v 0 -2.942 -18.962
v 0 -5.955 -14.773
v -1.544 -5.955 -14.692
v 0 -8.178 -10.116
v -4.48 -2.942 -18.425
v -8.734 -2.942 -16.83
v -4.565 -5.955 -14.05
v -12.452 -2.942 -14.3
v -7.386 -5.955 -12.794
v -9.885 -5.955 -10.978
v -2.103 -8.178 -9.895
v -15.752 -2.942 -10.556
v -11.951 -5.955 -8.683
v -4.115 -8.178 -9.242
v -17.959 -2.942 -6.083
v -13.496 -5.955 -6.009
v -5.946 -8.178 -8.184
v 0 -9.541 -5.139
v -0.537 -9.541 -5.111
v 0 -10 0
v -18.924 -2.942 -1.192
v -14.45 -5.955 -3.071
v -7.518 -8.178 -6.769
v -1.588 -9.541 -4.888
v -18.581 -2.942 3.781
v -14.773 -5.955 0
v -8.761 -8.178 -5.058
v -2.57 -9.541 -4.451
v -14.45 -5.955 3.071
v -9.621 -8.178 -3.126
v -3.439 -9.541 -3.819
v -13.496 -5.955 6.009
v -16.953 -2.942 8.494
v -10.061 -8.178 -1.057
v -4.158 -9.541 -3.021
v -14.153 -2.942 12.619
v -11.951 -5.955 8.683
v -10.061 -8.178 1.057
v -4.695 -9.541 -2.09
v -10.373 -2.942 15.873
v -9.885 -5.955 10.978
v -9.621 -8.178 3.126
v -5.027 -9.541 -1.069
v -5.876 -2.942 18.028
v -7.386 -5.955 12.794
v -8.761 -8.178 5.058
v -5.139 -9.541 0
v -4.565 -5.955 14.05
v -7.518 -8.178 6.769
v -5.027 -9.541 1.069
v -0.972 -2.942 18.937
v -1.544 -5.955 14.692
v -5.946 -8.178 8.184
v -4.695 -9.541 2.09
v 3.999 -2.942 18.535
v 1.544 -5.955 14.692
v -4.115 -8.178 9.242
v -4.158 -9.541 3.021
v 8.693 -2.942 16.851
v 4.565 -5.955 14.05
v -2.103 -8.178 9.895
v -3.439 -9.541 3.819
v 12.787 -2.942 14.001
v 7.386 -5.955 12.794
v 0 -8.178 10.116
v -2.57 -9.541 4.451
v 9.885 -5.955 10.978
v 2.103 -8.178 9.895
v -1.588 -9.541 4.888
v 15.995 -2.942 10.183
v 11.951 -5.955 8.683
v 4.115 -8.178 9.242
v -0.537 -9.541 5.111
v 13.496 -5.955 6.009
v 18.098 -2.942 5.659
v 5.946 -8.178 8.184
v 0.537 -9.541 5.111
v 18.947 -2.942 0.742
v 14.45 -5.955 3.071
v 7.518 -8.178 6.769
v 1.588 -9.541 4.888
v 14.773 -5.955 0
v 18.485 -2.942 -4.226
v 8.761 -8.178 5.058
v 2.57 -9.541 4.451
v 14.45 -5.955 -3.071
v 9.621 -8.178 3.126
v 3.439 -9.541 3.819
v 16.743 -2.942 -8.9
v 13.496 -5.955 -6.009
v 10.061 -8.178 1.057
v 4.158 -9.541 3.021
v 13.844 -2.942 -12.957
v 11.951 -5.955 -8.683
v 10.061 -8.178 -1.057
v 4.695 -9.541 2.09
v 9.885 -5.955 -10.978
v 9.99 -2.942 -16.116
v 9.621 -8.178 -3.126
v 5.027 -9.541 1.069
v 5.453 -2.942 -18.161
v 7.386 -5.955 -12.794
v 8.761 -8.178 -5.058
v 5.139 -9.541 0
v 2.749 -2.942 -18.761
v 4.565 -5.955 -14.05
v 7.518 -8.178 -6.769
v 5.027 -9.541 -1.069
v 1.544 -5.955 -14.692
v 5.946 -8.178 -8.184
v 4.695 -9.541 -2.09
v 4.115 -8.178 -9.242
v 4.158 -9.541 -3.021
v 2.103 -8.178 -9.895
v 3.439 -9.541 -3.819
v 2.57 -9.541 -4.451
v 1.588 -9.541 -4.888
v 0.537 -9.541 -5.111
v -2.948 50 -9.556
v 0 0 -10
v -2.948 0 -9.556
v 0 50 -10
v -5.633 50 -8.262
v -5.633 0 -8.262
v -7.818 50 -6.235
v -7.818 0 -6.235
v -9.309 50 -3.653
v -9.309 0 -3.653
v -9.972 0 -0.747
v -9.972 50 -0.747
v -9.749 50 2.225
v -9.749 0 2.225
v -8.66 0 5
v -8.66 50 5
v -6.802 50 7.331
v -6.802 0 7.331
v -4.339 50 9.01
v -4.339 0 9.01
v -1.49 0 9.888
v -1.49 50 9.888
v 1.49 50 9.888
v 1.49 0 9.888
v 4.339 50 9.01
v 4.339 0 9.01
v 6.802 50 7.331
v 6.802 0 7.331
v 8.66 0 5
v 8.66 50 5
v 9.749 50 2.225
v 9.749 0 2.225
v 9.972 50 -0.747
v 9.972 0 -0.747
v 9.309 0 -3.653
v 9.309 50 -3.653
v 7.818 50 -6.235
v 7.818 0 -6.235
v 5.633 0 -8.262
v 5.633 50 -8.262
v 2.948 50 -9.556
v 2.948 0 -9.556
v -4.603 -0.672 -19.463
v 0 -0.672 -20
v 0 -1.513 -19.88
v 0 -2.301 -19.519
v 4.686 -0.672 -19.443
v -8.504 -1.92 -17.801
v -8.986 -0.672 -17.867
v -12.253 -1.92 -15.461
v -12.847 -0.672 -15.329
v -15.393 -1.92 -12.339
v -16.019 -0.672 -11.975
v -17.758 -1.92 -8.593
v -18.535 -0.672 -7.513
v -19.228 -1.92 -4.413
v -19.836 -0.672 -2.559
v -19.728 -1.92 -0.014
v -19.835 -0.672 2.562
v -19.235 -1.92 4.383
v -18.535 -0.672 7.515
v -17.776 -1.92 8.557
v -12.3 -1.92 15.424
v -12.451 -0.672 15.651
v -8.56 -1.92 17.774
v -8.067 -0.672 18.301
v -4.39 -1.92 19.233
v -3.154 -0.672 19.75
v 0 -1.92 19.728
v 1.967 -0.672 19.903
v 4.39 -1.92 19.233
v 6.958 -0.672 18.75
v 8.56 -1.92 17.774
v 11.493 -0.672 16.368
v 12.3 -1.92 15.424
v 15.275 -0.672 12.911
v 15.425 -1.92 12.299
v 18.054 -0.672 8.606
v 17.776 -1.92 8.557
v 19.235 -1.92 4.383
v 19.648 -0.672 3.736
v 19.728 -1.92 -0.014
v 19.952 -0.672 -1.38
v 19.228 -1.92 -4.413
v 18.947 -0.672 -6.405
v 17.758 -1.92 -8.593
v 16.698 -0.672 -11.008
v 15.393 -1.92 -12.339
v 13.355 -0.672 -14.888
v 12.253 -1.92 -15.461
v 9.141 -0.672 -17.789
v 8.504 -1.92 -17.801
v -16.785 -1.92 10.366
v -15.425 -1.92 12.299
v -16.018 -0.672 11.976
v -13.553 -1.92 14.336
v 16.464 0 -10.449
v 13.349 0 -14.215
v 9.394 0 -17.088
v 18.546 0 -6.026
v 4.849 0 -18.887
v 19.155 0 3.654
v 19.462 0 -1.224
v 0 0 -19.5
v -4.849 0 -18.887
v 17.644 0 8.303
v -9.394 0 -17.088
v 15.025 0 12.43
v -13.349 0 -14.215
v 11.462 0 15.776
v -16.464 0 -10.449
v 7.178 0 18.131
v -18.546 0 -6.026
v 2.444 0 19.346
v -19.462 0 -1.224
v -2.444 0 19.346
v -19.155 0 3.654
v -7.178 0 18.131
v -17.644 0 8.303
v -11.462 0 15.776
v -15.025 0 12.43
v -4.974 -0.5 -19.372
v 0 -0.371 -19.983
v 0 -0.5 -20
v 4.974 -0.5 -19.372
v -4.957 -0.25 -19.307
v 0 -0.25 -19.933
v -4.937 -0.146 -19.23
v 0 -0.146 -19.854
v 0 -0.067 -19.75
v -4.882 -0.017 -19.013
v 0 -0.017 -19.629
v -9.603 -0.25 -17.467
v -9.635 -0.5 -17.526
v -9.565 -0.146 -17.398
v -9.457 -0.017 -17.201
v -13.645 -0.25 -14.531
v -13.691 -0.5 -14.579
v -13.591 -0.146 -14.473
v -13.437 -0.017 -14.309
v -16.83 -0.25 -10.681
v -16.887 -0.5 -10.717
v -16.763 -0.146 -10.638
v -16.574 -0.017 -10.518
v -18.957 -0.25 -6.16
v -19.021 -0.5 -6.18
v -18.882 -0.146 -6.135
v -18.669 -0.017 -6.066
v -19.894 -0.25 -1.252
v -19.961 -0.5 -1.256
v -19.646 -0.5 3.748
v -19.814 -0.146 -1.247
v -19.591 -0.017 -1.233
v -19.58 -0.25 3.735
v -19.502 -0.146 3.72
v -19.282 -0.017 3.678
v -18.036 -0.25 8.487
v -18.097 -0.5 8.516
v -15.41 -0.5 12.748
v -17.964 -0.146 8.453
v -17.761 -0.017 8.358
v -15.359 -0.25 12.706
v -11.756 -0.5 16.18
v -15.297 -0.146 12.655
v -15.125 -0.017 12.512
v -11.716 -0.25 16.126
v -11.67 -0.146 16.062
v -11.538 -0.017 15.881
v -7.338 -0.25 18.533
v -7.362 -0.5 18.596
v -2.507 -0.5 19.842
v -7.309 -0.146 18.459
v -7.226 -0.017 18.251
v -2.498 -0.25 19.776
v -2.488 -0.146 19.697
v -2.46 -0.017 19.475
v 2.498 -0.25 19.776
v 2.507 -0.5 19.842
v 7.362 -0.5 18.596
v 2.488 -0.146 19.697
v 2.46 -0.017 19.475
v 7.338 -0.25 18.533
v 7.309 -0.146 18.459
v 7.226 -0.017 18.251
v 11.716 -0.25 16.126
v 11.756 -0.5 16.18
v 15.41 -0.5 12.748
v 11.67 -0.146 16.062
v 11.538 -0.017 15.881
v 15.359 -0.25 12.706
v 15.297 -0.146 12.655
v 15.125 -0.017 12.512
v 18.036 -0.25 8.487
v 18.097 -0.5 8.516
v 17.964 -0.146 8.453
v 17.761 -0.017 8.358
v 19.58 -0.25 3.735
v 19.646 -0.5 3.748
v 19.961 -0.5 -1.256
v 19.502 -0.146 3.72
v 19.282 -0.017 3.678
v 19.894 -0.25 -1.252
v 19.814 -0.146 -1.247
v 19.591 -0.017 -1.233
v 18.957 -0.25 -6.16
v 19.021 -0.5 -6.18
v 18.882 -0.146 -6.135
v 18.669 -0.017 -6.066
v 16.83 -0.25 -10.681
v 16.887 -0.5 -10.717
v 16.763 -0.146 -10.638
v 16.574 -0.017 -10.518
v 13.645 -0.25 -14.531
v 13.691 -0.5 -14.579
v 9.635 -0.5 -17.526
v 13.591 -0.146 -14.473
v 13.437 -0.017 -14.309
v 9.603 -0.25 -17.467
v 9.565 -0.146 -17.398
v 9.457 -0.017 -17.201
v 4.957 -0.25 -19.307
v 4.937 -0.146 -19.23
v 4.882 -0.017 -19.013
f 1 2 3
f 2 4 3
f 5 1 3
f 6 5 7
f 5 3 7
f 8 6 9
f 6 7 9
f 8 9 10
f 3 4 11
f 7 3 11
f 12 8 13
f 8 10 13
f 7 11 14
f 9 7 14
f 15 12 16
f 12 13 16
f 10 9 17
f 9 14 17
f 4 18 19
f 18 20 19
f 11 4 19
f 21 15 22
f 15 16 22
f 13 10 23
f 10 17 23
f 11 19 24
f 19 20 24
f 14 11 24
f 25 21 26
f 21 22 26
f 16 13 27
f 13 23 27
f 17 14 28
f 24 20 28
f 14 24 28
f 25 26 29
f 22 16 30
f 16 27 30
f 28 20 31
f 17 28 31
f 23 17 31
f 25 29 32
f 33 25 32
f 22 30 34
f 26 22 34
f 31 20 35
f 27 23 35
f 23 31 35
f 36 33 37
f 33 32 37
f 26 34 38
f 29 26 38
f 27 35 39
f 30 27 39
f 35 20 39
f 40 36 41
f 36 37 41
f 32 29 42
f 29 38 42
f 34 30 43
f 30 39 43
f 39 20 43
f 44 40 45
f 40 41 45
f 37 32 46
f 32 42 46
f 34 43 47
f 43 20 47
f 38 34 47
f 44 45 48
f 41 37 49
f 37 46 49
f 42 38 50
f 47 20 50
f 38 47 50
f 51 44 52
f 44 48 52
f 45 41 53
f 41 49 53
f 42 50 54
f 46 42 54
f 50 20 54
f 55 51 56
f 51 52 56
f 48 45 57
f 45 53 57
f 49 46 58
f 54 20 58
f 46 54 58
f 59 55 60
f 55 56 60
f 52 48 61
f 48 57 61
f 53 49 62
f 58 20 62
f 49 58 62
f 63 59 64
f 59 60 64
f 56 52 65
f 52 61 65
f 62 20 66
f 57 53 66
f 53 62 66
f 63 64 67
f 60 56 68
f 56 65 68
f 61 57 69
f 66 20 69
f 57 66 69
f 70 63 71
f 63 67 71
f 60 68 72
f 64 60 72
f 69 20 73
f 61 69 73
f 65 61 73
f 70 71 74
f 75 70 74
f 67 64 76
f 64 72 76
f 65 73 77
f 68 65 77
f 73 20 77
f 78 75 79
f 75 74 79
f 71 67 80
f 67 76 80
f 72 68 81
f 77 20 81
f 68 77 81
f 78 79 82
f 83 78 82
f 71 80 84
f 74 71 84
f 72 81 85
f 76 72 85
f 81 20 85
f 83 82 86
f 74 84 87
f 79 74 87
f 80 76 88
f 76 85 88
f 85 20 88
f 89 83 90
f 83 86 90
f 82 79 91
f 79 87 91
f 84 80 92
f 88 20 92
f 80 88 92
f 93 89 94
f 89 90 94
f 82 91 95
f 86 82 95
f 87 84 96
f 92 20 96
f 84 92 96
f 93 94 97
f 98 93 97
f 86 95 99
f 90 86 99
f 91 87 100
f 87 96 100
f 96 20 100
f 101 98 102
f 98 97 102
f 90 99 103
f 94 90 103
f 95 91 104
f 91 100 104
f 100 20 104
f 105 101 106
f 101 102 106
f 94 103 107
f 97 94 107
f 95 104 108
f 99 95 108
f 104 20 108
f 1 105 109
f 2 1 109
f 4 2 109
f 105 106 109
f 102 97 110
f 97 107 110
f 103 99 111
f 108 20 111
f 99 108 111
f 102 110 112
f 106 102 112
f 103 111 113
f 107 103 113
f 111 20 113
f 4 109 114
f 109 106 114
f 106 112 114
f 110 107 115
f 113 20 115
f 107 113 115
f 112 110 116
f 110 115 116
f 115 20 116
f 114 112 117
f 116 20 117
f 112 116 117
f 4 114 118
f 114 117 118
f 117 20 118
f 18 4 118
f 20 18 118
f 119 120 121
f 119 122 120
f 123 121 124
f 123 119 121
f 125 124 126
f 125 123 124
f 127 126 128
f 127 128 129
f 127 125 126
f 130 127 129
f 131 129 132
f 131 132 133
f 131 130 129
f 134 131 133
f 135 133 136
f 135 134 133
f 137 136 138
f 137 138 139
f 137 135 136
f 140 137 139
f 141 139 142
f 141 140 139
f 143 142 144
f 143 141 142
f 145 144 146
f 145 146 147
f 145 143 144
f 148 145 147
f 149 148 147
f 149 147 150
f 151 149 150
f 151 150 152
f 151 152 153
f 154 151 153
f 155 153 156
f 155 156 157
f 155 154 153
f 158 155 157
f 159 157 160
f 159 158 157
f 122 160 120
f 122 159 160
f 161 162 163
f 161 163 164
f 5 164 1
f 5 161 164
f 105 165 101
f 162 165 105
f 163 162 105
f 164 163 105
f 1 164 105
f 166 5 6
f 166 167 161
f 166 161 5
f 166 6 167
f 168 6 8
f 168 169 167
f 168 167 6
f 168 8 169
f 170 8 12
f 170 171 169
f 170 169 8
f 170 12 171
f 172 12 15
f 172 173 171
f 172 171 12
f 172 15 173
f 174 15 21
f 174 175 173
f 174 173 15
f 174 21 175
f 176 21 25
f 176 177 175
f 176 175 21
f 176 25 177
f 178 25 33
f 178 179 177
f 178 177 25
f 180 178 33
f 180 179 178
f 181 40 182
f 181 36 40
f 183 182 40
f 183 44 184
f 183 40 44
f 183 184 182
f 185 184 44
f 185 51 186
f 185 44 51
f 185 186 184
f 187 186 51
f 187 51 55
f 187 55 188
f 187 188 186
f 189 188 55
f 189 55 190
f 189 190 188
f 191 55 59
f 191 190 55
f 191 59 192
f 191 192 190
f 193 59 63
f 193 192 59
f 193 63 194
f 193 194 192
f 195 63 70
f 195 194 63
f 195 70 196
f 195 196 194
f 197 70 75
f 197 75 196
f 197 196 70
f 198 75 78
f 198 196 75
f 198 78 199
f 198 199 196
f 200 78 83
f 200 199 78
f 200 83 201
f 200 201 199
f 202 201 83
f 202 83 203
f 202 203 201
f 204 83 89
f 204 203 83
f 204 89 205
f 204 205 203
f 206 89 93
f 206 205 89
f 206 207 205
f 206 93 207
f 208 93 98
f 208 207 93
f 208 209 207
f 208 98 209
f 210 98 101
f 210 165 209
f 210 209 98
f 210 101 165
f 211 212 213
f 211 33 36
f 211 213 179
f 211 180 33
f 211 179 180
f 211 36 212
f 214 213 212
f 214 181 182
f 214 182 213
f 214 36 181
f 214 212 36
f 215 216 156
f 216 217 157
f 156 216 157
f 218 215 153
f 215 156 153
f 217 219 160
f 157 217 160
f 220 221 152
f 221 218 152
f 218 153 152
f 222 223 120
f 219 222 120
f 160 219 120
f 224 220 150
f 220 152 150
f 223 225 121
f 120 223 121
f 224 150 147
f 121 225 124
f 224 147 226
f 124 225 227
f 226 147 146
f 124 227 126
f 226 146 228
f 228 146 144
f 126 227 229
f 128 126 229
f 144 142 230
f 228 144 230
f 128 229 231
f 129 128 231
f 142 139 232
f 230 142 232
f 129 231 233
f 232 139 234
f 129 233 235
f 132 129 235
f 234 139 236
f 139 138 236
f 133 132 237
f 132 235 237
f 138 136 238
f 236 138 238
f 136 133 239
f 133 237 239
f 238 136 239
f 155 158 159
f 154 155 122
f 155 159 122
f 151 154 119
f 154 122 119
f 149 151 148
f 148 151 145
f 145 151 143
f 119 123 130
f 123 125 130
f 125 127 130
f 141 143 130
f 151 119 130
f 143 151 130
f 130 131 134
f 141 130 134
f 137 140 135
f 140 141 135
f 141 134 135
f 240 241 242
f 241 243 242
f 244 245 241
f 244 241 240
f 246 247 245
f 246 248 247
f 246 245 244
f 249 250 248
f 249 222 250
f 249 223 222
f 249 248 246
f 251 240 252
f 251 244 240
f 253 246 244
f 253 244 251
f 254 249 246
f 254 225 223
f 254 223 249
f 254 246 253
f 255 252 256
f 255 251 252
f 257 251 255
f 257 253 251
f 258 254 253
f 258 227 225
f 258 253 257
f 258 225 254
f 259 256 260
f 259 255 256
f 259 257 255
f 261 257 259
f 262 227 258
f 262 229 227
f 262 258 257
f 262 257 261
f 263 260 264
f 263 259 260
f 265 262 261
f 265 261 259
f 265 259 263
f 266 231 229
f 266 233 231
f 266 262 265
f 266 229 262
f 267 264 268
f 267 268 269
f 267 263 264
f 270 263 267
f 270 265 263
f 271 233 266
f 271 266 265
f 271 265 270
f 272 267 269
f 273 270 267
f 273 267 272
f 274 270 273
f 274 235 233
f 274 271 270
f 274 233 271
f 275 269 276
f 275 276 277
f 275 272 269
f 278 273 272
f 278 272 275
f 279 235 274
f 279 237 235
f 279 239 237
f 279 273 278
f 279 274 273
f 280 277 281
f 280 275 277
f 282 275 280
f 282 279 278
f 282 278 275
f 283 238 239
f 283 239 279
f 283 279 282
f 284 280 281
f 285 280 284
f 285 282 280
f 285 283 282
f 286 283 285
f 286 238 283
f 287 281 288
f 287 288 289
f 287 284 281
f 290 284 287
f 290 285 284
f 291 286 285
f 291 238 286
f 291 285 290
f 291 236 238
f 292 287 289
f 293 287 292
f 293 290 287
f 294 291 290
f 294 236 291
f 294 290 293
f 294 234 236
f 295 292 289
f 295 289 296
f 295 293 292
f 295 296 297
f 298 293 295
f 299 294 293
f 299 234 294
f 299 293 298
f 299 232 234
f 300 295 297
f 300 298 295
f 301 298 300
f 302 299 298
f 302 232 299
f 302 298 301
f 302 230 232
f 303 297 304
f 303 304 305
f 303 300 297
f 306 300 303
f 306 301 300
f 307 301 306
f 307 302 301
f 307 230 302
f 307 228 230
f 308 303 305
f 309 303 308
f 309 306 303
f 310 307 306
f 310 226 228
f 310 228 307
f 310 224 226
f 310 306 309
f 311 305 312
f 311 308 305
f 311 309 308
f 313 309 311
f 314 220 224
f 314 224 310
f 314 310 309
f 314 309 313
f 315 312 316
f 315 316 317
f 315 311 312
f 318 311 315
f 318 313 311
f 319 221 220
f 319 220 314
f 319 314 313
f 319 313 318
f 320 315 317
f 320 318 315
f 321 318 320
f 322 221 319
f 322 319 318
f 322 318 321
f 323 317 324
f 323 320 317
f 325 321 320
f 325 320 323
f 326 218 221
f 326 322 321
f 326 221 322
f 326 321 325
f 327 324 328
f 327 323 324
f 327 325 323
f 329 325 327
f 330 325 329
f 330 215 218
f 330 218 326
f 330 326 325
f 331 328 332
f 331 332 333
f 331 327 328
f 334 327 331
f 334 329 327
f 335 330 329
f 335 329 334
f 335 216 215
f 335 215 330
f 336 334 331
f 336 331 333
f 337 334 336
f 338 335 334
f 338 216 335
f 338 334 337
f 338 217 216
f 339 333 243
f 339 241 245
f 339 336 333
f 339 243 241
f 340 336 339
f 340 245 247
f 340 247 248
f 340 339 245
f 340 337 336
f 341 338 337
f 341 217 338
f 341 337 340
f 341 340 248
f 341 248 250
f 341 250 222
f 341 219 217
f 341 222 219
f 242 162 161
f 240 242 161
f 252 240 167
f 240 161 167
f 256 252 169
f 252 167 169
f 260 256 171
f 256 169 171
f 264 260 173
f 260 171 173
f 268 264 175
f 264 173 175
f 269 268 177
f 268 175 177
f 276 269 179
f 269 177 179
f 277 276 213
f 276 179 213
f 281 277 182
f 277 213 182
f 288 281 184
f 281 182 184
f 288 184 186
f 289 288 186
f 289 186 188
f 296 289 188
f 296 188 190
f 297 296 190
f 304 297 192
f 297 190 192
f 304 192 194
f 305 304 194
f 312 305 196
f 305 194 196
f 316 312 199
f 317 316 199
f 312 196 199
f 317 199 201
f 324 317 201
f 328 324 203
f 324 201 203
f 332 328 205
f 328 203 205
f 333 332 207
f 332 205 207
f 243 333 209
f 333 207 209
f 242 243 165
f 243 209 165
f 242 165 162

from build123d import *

# Parameters (mm, degrees)
SKETCH2_W = 50
SKETCH2_H = 10
FILLET1_R = 3
FILLET2_R = 0.5


with BuildPart() as part:
    # Sketch2 → Revolve1 (revolve)
    with BuildSketch(Plane.YZ, mode=Mode.PRIVATE) as revolve1_sk:
        with BuildLine():
            Line((-10, 0), (-2, 0))
            Line((-2, 0), (-2, 20))
            ThreePointArc((-2, 20), (-7.925824036, 10.770329614), (-10, 0))
        make_face()
        Polygon((-2, 20), (-2, 0), (0, 0), (0, 10), (0, 20), align=None)
        with Locations((25, 5)):
            Rectangle(SKETCH2_W, SKETCH2_H)
    revolve(revolve1_sk.sketch.rotate(Axis((0, -34.621126621, 0), (0, 1, 0)), 180), axis=Axis((0, -34.621126621, 0), (0, 1, 0)))

    # Fillet1
    fillet1_edges = [part.edges().sort_by_distance(p)[0] for p in [
        (0, -2, 20),
    ]]
    fillet(fillet1_edges, radius=FILLET1_R)

    # Fillet2
    fillet2_edges = [part.edges().sort_by_distance(p)[0] for p in [
        (0, 0, 20),
    ]]
    fillet(fillet2_edges, radius=FILLET2_R)


solid = part.part
